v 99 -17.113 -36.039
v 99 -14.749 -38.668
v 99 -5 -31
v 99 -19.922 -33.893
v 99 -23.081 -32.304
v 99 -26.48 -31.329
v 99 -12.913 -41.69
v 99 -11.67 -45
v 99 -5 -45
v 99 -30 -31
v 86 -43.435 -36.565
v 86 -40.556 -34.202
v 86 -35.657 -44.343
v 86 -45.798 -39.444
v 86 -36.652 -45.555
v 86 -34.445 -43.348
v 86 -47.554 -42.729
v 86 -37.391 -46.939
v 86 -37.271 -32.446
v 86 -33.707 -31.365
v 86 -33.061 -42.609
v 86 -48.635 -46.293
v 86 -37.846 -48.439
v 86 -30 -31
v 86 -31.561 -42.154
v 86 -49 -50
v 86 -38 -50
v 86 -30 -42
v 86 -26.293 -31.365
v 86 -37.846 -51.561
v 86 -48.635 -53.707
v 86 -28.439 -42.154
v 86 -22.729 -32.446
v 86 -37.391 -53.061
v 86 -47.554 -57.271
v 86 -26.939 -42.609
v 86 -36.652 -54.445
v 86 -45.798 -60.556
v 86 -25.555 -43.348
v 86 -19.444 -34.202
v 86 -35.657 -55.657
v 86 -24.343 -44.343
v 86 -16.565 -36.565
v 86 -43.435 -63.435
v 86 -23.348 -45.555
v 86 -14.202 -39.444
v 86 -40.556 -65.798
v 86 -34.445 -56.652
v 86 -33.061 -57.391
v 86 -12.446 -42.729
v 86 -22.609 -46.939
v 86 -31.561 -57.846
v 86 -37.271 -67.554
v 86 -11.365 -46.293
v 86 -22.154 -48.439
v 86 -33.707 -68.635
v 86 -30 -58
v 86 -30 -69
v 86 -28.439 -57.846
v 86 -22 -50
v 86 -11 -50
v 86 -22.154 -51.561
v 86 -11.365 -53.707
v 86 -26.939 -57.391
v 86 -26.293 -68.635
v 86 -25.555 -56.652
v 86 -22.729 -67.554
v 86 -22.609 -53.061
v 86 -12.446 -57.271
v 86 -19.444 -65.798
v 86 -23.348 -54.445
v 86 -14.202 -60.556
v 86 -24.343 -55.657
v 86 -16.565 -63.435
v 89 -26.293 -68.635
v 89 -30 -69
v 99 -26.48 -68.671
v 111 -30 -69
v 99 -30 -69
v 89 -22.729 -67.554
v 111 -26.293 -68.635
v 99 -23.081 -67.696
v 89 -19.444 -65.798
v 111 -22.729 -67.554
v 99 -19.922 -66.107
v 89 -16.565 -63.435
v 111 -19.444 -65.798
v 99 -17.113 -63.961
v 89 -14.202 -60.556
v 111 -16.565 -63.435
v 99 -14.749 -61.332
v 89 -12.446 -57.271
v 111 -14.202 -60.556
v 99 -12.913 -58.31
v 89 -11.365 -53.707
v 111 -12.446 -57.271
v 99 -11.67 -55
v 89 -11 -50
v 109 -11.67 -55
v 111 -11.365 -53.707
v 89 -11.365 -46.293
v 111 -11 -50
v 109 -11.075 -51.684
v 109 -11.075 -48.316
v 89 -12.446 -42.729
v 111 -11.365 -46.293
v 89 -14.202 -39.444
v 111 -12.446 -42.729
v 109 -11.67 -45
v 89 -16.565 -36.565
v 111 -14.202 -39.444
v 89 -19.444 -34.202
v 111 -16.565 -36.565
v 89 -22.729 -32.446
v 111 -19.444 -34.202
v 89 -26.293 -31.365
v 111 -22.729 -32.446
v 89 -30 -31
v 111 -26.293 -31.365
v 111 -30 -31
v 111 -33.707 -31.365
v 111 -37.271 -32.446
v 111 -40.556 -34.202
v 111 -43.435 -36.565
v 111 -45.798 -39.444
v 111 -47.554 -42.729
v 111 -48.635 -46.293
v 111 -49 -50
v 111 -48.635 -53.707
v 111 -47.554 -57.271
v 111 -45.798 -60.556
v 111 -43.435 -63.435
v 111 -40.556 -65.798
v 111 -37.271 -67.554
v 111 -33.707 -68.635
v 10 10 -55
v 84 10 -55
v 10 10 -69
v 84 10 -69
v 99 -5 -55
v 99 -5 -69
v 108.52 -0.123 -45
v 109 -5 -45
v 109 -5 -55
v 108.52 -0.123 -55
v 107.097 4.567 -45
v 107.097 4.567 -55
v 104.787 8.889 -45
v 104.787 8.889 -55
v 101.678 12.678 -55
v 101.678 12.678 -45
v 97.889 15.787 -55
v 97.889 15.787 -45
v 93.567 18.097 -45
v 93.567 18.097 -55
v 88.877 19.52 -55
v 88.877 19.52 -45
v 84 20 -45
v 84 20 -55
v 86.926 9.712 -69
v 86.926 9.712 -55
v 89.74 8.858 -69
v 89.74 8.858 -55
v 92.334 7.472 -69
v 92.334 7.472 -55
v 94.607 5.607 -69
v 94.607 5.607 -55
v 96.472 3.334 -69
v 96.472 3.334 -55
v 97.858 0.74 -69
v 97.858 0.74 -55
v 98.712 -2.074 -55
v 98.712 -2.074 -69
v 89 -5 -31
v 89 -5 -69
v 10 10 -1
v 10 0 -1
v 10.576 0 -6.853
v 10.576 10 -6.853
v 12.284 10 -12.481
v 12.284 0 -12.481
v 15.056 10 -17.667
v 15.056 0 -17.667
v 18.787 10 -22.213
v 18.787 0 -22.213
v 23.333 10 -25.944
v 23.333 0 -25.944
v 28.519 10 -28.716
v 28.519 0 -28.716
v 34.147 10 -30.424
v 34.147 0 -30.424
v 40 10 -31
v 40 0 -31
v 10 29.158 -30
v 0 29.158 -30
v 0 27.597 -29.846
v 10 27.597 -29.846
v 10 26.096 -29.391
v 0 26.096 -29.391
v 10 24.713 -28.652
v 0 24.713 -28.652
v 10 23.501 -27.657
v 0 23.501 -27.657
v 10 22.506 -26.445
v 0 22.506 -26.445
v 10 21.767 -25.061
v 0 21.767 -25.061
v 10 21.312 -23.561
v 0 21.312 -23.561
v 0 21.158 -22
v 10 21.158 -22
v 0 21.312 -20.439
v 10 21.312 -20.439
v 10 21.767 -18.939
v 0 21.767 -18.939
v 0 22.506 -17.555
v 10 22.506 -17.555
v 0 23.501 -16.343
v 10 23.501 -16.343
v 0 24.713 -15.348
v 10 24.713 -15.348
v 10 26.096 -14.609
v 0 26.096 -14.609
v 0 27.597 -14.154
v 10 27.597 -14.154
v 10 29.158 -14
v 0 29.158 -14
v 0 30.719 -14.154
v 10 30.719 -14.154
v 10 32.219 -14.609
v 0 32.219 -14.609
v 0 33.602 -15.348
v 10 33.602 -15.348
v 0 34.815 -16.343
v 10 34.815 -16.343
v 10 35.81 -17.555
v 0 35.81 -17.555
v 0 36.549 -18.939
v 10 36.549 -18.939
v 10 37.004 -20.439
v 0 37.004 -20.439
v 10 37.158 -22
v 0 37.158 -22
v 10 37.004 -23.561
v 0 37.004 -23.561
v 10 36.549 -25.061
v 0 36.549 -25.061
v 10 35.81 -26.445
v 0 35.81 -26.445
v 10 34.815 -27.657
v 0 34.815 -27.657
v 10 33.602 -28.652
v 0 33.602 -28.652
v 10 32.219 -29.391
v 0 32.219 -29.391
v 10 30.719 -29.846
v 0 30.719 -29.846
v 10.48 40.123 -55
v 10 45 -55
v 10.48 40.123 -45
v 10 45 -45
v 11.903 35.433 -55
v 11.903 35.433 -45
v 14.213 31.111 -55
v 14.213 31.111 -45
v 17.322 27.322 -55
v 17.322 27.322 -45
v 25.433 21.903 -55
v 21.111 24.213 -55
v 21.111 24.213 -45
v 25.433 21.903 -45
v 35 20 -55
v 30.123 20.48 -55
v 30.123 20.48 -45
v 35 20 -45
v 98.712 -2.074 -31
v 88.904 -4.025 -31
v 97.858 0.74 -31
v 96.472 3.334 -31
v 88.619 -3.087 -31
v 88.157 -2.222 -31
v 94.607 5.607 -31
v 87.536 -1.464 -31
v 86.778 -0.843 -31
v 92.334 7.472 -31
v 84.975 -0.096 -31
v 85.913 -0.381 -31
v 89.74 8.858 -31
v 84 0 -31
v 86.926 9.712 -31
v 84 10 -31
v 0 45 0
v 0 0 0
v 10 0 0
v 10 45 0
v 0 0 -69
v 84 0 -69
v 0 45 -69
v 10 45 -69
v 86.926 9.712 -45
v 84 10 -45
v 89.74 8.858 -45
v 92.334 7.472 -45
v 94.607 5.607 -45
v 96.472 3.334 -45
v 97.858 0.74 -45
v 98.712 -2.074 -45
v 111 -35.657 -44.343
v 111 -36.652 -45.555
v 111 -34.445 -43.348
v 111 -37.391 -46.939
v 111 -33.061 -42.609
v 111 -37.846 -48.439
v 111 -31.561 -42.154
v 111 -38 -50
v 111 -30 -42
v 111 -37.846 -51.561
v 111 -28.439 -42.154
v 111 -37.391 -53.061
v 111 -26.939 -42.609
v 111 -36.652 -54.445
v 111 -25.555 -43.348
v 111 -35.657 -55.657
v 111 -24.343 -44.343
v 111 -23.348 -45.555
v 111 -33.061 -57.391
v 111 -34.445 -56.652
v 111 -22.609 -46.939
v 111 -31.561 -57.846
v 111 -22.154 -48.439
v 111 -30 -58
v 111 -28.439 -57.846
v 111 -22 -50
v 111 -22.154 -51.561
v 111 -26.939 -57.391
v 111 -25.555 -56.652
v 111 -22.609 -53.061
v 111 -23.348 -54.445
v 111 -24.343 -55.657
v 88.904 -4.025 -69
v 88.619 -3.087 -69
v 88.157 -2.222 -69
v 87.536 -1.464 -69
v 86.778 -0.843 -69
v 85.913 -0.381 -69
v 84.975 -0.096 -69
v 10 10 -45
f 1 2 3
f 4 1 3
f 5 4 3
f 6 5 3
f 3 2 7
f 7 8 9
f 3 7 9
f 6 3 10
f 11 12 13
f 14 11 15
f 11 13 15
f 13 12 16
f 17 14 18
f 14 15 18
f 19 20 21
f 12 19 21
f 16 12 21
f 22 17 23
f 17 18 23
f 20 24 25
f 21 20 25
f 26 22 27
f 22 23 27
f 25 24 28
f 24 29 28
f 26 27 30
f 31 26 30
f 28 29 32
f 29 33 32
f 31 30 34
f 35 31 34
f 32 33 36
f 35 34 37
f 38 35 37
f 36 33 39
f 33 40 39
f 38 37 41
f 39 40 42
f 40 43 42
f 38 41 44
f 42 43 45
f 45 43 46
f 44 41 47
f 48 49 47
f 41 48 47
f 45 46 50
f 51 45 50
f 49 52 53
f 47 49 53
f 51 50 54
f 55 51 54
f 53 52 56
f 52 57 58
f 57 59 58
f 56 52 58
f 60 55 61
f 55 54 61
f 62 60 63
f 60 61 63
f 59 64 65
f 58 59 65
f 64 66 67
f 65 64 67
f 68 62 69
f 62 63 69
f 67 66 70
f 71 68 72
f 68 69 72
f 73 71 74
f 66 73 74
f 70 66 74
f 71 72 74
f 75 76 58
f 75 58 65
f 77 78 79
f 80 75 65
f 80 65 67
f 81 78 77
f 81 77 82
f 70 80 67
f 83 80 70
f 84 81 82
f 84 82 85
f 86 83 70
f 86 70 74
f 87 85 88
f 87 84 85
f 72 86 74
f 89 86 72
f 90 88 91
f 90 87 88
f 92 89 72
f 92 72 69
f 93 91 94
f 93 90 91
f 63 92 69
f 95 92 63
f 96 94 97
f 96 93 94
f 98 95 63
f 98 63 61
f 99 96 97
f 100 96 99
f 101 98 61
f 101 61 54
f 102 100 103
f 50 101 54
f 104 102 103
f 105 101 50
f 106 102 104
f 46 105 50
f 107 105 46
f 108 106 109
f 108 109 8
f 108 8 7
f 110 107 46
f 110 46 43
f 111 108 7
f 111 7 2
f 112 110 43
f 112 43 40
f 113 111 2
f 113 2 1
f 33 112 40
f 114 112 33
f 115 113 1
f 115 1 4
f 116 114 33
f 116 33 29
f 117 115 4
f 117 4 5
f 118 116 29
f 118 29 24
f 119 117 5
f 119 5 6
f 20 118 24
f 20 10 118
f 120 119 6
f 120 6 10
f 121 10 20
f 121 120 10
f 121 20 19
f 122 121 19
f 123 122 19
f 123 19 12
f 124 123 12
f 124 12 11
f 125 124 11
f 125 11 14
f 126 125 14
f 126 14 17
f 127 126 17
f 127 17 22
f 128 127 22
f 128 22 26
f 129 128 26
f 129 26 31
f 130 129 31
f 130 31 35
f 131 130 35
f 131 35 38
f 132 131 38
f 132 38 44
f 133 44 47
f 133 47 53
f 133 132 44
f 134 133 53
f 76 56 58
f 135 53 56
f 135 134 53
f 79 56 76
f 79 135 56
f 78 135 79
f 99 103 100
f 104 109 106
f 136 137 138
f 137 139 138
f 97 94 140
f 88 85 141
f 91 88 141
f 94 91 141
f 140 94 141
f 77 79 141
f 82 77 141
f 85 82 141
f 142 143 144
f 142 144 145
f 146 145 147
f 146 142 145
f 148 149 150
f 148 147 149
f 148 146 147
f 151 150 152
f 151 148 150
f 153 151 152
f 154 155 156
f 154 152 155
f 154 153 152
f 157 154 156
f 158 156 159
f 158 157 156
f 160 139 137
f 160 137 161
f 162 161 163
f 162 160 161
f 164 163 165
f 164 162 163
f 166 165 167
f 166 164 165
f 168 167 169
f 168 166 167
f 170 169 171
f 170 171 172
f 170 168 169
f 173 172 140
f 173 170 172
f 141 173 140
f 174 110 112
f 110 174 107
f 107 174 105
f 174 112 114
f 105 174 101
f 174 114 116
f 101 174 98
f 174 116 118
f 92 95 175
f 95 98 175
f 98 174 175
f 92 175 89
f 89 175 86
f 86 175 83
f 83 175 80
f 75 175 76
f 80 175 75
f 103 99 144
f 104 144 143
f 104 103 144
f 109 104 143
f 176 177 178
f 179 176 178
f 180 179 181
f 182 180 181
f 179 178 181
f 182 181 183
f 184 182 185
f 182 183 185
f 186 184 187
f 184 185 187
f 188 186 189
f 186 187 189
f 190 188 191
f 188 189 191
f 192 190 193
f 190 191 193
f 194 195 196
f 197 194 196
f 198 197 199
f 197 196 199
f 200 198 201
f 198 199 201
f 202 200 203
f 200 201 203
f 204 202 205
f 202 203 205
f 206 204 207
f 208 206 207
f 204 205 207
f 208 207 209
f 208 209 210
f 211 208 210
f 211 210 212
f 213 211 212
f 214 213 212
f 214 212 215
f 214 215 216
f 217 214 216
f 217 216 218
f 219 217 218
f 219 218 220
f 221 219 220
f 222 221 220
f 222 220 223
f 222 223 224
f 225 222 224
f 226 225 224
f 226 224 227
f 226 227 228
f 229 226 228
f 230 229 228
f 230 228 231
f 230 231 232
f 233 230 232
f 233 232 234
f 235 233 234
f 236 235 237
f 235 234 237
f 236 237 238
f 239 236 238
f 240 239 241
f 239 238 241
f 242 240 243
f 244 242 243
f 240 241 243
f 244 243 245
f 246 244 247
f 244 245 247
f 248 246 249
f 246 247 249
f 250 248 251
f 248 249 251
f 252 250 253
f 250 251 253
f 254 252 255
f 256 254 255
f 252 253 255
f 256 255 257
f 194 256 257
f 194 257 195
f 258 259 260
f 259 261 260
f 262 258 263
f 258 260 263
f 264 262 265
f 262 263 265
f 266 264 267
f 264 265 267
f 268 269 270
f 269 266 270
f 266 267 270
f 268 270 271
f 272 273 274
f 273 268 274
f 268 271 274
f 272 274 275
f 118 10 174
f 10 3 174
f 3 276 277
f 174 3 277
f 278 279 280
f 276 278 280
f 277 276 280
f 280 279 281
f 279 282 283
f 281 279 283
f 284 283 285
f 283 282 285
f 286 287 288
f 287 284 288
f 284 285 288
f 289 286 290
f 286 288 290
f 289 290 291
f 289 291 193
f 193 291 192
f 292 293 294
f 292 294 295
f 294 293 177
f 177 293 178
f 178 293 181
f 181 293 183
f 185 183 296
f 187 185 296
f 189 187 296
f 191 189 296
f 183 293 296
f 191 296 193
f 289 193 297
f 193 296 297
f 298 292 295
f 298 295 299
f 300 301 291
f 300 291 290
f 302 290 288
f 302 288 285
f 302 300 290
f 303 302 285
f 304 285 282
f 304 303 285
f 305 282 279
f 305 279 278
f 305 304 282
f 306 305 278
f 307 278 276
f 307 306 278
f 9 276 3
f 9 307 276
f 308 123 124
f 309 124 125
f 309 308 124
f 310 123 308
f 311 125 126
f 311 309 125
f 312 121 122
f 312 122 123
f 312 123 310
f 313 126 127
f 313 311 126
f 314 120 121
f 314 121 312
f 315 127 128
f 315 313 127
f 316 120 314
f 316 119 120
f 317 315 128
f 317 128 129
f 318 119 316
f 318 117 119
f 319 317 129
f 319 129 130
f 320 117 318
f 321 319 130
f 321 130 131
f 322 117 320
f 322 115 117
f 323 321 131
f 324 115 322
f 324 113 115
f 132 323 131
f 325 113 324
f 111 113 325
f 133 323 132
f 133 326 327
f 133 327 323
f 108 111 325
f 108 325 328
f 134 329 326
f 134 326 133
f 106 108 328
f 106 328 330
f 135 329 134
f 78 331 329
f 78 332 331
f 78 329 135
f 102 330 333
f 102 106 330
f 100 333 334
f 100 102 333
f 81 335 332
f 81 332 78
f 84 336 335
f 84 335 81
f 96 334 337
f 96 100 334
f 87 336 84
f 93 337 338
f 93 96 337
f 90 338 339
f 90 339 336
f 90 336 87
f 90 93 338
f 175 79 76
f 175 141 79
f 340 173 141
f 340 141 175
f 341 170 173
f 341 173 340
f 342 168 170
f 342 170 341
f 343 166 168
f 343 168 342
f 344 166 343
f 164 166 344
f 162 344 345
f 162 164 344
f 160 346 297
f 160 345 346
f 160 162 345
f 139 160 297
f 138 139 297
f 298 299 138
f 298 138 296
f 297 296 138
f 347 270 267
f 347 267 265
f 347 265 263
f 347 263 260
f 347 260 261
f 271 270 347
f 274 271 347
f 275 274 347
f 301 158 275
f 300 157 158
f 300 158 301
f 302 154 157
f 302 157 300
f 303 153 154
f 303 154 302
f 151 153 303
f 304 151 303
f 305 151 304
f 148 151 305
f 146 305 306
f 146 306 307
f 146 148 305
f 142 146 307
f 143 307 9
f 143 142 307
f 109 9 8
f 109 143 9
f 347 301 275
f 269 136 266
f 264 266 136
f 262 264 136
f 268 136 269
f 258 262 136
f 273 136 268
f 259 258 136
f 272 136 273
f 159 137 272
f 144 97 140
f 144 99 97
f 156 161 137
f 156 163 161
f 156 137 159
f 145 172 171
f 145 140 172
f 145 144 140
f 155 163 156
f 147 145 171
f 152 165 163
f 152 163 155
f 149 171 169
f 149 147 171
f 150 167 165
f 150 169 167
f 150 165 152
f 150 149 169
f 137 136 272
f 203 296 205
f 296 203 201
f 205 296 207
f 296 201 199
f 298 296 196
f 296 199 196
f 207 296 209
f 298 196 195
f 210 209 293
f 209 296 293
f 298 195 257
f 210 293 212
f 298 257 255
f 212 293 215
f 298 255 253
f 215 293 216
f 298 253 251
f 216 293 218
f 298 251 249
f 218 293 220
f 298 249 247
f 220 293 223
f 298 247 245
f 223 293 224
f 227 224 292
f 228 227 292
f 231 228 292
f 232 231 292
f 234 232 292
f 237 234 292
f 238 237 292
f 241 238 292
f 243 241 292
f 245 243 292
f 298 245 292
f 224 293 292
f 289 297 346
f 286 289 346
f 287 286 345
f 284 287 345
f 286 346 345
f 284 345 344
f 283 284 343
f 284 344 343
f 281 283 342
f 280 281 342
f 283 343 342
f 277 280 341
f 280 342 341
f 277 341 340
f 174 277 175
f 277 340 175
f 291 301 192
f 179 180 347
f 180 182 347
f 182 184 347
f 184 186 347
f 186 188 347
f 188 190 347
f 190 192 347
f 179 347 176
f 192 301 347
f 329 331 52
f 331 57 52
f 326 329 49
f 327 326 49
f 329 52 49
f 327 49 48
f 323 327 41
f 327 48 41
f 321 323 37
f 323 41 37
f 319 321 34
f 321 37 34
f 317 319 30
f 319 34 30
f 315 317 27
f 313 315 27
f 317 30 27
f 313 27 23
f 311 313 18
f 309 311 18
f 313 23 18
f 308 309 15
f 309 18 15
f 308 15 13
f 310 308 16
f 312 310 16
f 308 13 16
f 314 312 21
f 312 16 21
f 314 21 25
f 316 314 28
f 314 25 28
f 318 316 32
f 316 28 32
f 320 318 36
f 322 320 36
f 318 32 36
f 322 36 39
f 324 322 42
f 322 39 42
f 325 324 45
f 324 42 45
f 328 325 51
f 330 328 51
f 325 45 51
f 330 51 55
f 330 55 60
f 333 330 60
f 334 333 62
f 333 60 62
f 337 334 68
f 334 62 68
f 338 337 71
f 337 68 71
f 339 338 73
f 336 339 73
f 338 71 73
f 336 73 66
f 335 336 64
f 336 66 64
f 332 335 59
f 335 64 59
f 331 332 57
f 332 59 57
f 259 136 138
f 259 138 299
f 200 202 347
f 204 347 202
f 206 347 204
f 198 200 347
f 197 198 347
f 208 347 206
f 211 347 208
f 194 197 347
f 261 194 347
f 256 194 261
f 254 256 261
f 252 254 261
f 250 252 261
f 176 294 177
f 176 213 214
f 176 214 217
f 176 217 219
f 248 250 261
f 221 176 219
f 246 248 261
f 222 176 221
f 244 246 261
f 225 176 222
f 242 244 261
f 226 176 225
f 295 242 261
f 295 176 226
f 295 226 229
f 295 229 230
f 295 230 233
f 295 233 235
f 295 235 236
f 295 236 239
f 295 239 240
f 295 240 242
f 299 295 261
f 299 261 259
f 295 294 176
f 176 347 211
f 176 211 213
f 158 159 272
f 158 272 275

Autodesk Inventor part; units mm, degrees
ref_plane "YZ Plane" through (0, 0, 0) normal (1, 0, 0) x (0, 1, 0)
ref_plane "XZ Plane" through (0, 0, 0) normal (0, 1, 0) x (-1, 0, 0)
sketch "Esboço1" plane through (0, 0, 0) normal (1, 0, 0) x (0, 1, 0)
  line L0 (0, 0) -> (45, 0)
  line L1 (45, 0) -> (45, -69)
  line L2 (45, -69) -> (0, -69)
  line L3 (0, -69) -> (0, 0)
  dimension "d0" = 45
  dimension "d1" = 69
extrude "Extrusão1" add sketch "Esboço1" along normal blind 10
sketch "Esboço2" plane through (10, 0, 0) normal (1, 0, 0) x (0, 0, -1)
  line L0 (0, 45) -> (0, 0) projected
  point P0 (22, 29.1579)
  dimension "d4" = 22
hole "Furo1" at (10, 29.1579, -22) direction (-1, 0, 0) diameter 16 end through all
ref_plane "Plano de trabalho1" through (111, 0, 0) normal (1, 0, 0) x (0, 0, -1)
sketch "Esboço3" plane through (111, 0, 0) normal (1, 0, 0) x (0, 0, -1)
  circle A0 centre (50, -30) radius 19
  line L0 (69, 0) -> (69, 45) projected
  line L1 (69, 45) -> (0, 45) projected
  point P0 (0, 0)
  dimension "d13" = 38
  dimension "d14" = 75
extrude "Extrusão2" add sketch "Esboço3" against normal blind 25
sketch "Esboço4" plane through (0, 0, -69) normal (0, 0, -1) x (-1, 0, 0)
  line L0 (-10, 0) -> (-84, 0)
  line L1 (-89, -5) -> (-89, -30)
  line L2 (-89, -30) -> (-99, -30)
  line L3 (-99, -30) -> (-99, -5)
  line L4 (-84, 10) -> (-10, 10)
  line L5 (-10, 10) -> (-10, 0)
  line L6 (-111, -11) -> (-111, -49) construction
  line L7 (-111, -30) -> (-86, -30) construction
  line L8 (-86, -49) -> (-86, -11) construction
  arc A0 (-84, 0) -> (-89, -5) centre (-84, -5) ccw
  arc A1 (-84, 10) -> (-99, -5) centre (-84, -5) ccw
  point P0 (0, 0)
  dimension "d17" = 3
  dimension "d18" = 10
  dimension "d19" = 10
  dimension "d20" = 5
  dimension "d21" = 15
extrude "Extrusão3" add sketch "Esboço4" against normal blind 38
sketch "Esboço5" plane through (10, 0, 0) normal (1, 0, 0) x (0, 0, -1)
  line L0 (69, 10) -> (31, 10) projected
  line L1 (45, 10) -> (55, 10)
  line L2 (55, 10) -> (55, 20)
  line L3 (55, 20) -> (45, 20)
  line L4 (45, 20) -> (45, 10)
  line L5 (31, 10) -> (31, -5) projected
  point P0 (0, 0)
  dimension "d24" = 10
  dimension "d25" = 10
  dimension "d26" = 14
sketch3d "Esboço 3D1"
  line L0 (10, 10, -69) -> (84, 10, -69)
  arc A0 (84, 10, -69) -> (99, -5, -69) centre (84, -5, -69) ccw
  line L1 (99, -5, -69) -> (99, -30, -69)
sweep "Varredura1" add profiles "Esboço5" path "Esboço 3D1"
fillet "Arredondamento1" radius 25 1 edges at (10, 20, -50)
fillet "Arredondamento2" radius 30 1 edges at (10, 5, -31)
sketch "Esboço6" plane through (111, -30, -50) normal (1, 0, 0) x (0, 0, -1)
  circle A0 centre (0, 0) radius 19 projected
  point P0 (-50, 30)
hole "Furo2" at (111, -30, -50) direction (-1, 0, 0) diameter 16 end through all
properties part number "Peça teste 5" material "Prata"
